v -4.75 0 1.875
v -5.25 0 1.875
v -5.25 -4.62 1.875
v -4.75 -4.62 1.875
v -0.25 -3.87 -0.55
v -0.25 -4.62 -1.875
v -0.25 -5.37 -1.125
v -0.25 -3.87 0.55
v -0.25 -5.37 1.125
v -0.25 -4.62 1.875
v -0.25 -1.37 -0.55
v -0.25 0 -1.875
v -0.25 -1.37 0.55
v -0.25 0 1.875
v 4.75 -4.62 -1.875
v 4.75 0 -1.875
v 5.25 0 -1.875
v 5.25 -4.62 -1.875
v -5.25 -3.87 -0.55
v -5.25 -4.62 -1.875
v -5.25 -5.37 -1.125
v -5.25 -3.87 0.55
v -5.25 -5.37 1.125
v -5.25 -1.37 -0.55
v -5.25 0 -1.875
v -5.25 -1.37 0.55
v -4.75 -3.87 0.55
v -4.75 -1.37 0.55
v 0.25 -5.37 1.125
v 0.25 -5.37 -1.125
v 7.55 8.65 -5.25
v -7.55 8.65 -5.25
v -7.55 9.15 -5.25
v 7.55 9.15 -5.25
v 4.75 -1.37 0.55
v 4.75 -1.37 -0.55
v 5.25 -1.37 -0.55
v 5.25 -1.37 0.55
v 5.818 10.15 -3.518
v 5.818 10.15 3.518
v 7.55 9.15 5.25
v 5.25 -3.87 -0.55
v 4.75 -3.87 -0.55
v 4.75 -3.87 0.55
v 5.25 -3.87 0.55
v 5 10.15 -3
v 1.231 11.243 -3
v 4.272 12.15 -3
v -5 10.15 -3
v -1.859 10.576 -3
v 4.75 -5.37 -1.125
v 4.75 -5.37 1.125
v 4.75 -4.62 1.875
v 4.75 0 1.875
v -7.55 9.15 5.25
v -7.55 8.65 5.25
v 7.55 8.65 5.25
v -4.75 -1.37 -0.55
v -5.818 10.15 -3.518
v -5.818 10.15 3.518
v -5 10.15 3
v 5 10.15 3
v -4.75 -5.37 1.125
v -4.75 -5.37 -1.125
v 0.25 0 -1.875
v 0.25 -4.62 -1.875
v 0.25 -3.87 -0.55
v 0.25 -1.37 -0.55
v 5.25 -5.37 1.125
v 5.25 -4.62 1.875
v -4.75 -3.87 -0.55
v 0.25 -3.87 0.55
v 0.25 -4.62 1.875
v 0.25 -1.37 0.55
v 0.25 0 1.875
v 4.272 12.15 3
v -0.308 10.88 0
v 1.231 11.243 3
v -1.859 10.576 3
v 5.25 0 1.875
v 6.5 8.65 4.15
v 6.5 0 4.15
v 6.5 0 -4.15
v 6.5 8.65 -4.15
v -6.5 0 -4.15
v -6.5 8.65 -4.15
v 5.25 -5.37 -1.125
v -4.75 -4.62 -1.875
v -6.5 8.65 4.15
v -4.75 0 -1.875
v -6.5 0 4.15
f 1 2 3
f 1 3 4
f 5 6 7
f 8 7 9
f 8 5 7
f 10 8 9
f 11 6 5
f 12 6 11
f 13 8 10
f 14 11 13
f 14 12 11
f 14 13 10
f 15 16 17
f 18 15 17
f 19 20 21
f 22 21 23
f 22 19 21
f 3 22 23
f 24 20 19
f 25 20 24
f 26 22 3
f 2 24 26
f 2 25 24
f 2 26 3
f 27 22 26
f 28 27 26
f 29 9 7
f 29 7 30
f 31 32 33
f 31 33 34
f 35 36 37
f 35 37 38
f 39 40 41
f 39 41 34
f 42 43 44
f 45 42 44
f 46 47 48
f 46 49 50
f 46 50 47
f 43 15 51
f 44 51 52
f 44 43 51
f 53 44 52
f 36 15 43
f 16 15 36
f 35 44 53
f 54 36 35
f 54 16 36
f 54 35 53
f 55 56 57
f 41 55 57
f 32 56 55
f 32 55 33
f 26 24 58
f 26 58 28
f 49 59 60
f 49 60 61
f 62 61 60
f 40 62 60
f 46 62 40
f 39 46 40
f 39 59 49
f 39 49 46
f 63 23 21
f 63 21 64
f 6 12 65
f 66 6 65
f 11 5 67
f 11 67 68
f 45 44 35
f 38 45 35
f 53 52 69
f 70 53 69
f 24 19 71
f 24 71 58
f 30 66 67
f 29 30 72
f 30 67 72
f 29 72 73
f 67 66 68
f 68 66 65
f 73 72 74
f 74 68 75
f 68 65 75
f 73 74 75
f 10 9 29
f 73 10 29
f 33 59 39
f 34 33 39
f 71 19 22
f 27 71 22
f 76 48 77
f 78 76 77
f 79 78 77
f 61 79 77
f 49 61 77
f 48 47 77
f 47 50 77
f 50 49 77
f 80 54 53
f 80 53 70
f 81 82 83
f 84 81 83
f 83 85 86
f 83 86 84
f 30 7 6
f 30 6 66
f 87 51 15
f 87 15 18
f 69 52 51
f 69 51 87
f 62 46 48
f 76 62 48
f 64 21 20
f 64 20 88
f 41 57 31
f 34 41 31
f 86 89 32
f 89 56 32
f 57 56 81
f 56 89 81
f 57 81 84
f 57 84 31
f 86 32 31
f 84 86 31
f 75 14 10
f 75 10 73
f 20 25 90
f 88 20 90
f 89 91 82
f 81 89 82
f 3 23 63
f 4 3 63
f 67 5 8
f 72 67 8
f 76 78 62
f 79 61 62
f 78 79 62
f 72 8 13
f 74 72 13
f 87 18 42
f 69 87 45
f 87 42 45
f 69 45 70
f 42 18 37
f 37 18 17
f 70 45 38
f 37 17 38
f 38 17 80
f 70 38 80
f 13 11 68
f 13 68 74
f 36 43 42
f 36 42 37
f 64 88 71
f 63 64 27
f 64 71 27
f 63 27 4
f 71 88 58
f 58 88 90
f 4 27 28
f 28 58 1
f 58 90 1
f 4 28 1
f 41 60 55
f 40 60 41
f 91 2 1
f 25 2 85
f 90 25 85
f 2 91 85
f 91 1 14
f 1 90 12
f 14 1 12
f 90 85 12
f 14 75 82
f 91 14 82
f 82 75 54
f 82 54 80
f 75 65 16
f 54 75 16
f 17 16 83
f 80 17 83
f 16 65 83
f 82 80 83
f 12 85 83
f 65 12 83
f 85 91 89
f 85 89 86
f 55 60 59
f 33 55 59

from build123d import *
from OCP.BRepFilletAPI import BRepFilletAPI_MakeChamfer

# Parameters (mm, degrees)
SKETCH1_W           = 13
SKETCH1_H           = 8.3
BOSS_EXTRUDE1_DEPTH = 8.65
SKETCH3_W           = 15.1
SKETCH3_H           = 10.5
BOSS_EXTRUDE2_DEPTH = 1.5
CHAMFER1_SIZE       = 1
CHAMFER1_SIZE2      = 1.732050808
SKETCH4_W           = 10
SKETCH4_H           = 6
BOSS_EXTRUDE3_DEPTH = 2
CUT_EXTRUDE2_DEPTH  = 6
SKETCH6_W           = 0.5
SKETCH6_H           = 3.75
BOSS_EXTRUDE4_DEPTH = 5.37
CHAMFER2_SIZE       = 0.75
CUT_EXTRUDE3_REACH  = 20.413
SKETCH7_W           = 1.1
SKETCH7_H           = 2.5


with BuildPart() as part:
    # Sketch1 → Boss-Extrude1 (new body)
    with BuildSketch(Plane(origin=(0, 0, 0), x_dir=(1, 0, 0), z_dir=(0, 1, 0))):
        Rectangle(SKETCH1_W, SKETCH1_H)
    extrude(amount=BOSS_EXTRUDE1_DEPTH)

    # Sketch3 → Boss-Extrude2 (add)
    with BuildSketch(Plane(origin=(0, 8.65, 0), x_dir=(1, 0, 0), z_dir=(0, 1, 0))):
        Rectangle(SKETCH3_W, SKETCH3_H)
    extrude(amount=BOSS_EXTRUDE2_DEPTH)

    # Chamfer1: one chamfer whose edges measure the first distance from different faces: ONE call of the kernel's chamfer builder (chamfer() names one face for all edges)
    chamfer1_edges_1 = [part.edges().sort_by_distance(p)[0] for p in [
        (-7.55, 10.15, 0),
    ]]
    chamfer1_side_1 = [part.faces().sort_by_distance(p)[0] for p in [
        (-7.55, 9.4, 0),
    ]]
    chamfer1_edges_2 = [part.edges().sort_by_distance(p)[0] for p in [
        (0, 10.15, 5.25),
    ]]
    chamfer1_side_2 = [part.faces().sort_by_distance(p)[0] for p in [
        (0, 9.4, 5.25),
    ]]
    chamfer1_edges_3 = [part.edges().sort_by_distance(p)[0] for p in [
        (7.55, 10.15, 0),
    ]]
    chamfer1_side_3 = [part.faces().sort_by_distance(p)[0] for p in [
        (7.55, 9.4, 0),
    ]]
    chamfer1_edges_4 = [part.edges().sort_by_distance(p)[0] for p in [
        (0, 10.15, -5.25),
    ]]
    chamfer1_side_4 = [part.faces().sort_by_distance(p)[0] for p in [
        (0, 9.4, -5.25),
    ]]
    chamfer1 = BRepFilletAPI_MakeChamfer(part.part.solid().wrapped)
    for e in chamfer1_edges_1:
        chamfer1.Add(CHAMFER1_SIZE, CHAMFER1_SIZE2, e.wrapped, chamfer1_side_1[0].wrapped)  # the first distance lies on this face
    for e in chamfer1_edges_2:
        chamfer1.Add(CHAMFER1_SIZE, CHAMFER1_SIZE2, e.wrapped, chamfer1_side_2[0].wrapped)  # the first distance lies on this face
    for e in chamfer1_edges_3:
        chamfer1.Add(CHAMFER1_SIZE, CHAMFER1_SIZE2, e.wrapped, chamfer1_side_3[0].wrapped)  # the first distance lies on this face
    for e in chamfer1_edges_4:
        chamfer1.Add(CHAMFER1_SIZE, CHAMFER1_SIZE2, e.wrapped, chamfer1_side_4[0].wrapped)  # the first distance lies on this face
    add(Compound.cast(chamfer1.Shape()), mode=Mode.REPLACE)

    # Sketch4 → Boss-Extrude3 (add)
    with BuildSketch(Plane(origin=(0, 10.15, 0), x_dir=(1, 0, 0), z_dir=(0, 1, 0))):
        Rectangle(SKETCH4_W, SKETCH4_H)
    extrude(amount=BOSS_EXTRUDE3_DEPTH)

    # Sketch5 → Cut-Extrude2 (cut)
    with BuildSketch(Plane(origin=(0, 0, -3), x_dir=(-1, 0, 0), z_dir=(0, 0, -1))):
        with BuildLine():
            Line((5, 12.15), (-4.272059531, 12.15))
            add(Edge.make_bspline(
                [(-4.272059531, 12.15), (0.251528144, 10.609590956), (5, 10.15)],
                knots=[0, 0, 0, 1, 1, 1], degree=2))
            Line((5, 10.15), (5, 12.15))
        make_face()
        Polygon((-5, 12.15), (-5, 10.15), (-4.272059531, 12.15), align=None)
    extrude(amount=-CUT_EXTRUDE2_DEPTH, mode=Mode.SUBTRACT)

    # Sketch6 → Boss-Extrude4 (add)
    with BuildSketch(Plane.XZ):
        Rectangle(SKETCH6_W, SKETCH6_H)
        with Locations((5, 0)):
            Rectangle(SKETCH6_W, SKETCH6_H)
        with Locations((-5, 0)):
            Rectangle(SKETCH6_W, SKETCH6_H)
    extrude(amount=BOSS_EXTRUDE4_DEPTH)

    # Chamfer2
    chamfer2_edges = [part.edges().sort_by_distance(p)[0] for p in [
        (0, -5.37, 1.875),
        (0, -5.37, -1.875),
        (5, -5.37, 1.875),
        (5, -5.37, -1.875),
        (-5, -5.37, 1.875),
        (-5, -5.37, -1.875),
    ]]
    chamfer(chamfer2_edges, length=CHAMFER2_SIZE)

    # Cut-Extrude3: up to this face of the body (flat: up to its plane)
    cut_extrude3_end = Plane(part.part.faces().sort_by_distance((5.25, -2.615028736, 0))[0])
    # Sketch7 → Cut-Extrude3 (cut, up to the picked face)
    with BuildSketch(Plane.ZY.offset(5.25), mode=Mode.PRIVATE) as cut_extrude3_sk1:
        with Locations((0, -2.62)):
            Rectangle(SKETCH7_W, SKETCH7_H)
    cut_extrude3_tool1 = split(extrude(cut_extrude3_sk1.sketch, amount=-CUT_EXTRUDE3_REACH, mode=Mode.PRIVATE), bisect_by=cut_extrude3_end, keep=Keep.BOTH, mode=Mode.PRIVATE)
    add(cut_extrude3_tool1.solids().sort_by(Axis((-5.25, -2.62, 0), (1, 0, 0)))[0], mode=Mode.SUBTRACT)


solid = part.part
